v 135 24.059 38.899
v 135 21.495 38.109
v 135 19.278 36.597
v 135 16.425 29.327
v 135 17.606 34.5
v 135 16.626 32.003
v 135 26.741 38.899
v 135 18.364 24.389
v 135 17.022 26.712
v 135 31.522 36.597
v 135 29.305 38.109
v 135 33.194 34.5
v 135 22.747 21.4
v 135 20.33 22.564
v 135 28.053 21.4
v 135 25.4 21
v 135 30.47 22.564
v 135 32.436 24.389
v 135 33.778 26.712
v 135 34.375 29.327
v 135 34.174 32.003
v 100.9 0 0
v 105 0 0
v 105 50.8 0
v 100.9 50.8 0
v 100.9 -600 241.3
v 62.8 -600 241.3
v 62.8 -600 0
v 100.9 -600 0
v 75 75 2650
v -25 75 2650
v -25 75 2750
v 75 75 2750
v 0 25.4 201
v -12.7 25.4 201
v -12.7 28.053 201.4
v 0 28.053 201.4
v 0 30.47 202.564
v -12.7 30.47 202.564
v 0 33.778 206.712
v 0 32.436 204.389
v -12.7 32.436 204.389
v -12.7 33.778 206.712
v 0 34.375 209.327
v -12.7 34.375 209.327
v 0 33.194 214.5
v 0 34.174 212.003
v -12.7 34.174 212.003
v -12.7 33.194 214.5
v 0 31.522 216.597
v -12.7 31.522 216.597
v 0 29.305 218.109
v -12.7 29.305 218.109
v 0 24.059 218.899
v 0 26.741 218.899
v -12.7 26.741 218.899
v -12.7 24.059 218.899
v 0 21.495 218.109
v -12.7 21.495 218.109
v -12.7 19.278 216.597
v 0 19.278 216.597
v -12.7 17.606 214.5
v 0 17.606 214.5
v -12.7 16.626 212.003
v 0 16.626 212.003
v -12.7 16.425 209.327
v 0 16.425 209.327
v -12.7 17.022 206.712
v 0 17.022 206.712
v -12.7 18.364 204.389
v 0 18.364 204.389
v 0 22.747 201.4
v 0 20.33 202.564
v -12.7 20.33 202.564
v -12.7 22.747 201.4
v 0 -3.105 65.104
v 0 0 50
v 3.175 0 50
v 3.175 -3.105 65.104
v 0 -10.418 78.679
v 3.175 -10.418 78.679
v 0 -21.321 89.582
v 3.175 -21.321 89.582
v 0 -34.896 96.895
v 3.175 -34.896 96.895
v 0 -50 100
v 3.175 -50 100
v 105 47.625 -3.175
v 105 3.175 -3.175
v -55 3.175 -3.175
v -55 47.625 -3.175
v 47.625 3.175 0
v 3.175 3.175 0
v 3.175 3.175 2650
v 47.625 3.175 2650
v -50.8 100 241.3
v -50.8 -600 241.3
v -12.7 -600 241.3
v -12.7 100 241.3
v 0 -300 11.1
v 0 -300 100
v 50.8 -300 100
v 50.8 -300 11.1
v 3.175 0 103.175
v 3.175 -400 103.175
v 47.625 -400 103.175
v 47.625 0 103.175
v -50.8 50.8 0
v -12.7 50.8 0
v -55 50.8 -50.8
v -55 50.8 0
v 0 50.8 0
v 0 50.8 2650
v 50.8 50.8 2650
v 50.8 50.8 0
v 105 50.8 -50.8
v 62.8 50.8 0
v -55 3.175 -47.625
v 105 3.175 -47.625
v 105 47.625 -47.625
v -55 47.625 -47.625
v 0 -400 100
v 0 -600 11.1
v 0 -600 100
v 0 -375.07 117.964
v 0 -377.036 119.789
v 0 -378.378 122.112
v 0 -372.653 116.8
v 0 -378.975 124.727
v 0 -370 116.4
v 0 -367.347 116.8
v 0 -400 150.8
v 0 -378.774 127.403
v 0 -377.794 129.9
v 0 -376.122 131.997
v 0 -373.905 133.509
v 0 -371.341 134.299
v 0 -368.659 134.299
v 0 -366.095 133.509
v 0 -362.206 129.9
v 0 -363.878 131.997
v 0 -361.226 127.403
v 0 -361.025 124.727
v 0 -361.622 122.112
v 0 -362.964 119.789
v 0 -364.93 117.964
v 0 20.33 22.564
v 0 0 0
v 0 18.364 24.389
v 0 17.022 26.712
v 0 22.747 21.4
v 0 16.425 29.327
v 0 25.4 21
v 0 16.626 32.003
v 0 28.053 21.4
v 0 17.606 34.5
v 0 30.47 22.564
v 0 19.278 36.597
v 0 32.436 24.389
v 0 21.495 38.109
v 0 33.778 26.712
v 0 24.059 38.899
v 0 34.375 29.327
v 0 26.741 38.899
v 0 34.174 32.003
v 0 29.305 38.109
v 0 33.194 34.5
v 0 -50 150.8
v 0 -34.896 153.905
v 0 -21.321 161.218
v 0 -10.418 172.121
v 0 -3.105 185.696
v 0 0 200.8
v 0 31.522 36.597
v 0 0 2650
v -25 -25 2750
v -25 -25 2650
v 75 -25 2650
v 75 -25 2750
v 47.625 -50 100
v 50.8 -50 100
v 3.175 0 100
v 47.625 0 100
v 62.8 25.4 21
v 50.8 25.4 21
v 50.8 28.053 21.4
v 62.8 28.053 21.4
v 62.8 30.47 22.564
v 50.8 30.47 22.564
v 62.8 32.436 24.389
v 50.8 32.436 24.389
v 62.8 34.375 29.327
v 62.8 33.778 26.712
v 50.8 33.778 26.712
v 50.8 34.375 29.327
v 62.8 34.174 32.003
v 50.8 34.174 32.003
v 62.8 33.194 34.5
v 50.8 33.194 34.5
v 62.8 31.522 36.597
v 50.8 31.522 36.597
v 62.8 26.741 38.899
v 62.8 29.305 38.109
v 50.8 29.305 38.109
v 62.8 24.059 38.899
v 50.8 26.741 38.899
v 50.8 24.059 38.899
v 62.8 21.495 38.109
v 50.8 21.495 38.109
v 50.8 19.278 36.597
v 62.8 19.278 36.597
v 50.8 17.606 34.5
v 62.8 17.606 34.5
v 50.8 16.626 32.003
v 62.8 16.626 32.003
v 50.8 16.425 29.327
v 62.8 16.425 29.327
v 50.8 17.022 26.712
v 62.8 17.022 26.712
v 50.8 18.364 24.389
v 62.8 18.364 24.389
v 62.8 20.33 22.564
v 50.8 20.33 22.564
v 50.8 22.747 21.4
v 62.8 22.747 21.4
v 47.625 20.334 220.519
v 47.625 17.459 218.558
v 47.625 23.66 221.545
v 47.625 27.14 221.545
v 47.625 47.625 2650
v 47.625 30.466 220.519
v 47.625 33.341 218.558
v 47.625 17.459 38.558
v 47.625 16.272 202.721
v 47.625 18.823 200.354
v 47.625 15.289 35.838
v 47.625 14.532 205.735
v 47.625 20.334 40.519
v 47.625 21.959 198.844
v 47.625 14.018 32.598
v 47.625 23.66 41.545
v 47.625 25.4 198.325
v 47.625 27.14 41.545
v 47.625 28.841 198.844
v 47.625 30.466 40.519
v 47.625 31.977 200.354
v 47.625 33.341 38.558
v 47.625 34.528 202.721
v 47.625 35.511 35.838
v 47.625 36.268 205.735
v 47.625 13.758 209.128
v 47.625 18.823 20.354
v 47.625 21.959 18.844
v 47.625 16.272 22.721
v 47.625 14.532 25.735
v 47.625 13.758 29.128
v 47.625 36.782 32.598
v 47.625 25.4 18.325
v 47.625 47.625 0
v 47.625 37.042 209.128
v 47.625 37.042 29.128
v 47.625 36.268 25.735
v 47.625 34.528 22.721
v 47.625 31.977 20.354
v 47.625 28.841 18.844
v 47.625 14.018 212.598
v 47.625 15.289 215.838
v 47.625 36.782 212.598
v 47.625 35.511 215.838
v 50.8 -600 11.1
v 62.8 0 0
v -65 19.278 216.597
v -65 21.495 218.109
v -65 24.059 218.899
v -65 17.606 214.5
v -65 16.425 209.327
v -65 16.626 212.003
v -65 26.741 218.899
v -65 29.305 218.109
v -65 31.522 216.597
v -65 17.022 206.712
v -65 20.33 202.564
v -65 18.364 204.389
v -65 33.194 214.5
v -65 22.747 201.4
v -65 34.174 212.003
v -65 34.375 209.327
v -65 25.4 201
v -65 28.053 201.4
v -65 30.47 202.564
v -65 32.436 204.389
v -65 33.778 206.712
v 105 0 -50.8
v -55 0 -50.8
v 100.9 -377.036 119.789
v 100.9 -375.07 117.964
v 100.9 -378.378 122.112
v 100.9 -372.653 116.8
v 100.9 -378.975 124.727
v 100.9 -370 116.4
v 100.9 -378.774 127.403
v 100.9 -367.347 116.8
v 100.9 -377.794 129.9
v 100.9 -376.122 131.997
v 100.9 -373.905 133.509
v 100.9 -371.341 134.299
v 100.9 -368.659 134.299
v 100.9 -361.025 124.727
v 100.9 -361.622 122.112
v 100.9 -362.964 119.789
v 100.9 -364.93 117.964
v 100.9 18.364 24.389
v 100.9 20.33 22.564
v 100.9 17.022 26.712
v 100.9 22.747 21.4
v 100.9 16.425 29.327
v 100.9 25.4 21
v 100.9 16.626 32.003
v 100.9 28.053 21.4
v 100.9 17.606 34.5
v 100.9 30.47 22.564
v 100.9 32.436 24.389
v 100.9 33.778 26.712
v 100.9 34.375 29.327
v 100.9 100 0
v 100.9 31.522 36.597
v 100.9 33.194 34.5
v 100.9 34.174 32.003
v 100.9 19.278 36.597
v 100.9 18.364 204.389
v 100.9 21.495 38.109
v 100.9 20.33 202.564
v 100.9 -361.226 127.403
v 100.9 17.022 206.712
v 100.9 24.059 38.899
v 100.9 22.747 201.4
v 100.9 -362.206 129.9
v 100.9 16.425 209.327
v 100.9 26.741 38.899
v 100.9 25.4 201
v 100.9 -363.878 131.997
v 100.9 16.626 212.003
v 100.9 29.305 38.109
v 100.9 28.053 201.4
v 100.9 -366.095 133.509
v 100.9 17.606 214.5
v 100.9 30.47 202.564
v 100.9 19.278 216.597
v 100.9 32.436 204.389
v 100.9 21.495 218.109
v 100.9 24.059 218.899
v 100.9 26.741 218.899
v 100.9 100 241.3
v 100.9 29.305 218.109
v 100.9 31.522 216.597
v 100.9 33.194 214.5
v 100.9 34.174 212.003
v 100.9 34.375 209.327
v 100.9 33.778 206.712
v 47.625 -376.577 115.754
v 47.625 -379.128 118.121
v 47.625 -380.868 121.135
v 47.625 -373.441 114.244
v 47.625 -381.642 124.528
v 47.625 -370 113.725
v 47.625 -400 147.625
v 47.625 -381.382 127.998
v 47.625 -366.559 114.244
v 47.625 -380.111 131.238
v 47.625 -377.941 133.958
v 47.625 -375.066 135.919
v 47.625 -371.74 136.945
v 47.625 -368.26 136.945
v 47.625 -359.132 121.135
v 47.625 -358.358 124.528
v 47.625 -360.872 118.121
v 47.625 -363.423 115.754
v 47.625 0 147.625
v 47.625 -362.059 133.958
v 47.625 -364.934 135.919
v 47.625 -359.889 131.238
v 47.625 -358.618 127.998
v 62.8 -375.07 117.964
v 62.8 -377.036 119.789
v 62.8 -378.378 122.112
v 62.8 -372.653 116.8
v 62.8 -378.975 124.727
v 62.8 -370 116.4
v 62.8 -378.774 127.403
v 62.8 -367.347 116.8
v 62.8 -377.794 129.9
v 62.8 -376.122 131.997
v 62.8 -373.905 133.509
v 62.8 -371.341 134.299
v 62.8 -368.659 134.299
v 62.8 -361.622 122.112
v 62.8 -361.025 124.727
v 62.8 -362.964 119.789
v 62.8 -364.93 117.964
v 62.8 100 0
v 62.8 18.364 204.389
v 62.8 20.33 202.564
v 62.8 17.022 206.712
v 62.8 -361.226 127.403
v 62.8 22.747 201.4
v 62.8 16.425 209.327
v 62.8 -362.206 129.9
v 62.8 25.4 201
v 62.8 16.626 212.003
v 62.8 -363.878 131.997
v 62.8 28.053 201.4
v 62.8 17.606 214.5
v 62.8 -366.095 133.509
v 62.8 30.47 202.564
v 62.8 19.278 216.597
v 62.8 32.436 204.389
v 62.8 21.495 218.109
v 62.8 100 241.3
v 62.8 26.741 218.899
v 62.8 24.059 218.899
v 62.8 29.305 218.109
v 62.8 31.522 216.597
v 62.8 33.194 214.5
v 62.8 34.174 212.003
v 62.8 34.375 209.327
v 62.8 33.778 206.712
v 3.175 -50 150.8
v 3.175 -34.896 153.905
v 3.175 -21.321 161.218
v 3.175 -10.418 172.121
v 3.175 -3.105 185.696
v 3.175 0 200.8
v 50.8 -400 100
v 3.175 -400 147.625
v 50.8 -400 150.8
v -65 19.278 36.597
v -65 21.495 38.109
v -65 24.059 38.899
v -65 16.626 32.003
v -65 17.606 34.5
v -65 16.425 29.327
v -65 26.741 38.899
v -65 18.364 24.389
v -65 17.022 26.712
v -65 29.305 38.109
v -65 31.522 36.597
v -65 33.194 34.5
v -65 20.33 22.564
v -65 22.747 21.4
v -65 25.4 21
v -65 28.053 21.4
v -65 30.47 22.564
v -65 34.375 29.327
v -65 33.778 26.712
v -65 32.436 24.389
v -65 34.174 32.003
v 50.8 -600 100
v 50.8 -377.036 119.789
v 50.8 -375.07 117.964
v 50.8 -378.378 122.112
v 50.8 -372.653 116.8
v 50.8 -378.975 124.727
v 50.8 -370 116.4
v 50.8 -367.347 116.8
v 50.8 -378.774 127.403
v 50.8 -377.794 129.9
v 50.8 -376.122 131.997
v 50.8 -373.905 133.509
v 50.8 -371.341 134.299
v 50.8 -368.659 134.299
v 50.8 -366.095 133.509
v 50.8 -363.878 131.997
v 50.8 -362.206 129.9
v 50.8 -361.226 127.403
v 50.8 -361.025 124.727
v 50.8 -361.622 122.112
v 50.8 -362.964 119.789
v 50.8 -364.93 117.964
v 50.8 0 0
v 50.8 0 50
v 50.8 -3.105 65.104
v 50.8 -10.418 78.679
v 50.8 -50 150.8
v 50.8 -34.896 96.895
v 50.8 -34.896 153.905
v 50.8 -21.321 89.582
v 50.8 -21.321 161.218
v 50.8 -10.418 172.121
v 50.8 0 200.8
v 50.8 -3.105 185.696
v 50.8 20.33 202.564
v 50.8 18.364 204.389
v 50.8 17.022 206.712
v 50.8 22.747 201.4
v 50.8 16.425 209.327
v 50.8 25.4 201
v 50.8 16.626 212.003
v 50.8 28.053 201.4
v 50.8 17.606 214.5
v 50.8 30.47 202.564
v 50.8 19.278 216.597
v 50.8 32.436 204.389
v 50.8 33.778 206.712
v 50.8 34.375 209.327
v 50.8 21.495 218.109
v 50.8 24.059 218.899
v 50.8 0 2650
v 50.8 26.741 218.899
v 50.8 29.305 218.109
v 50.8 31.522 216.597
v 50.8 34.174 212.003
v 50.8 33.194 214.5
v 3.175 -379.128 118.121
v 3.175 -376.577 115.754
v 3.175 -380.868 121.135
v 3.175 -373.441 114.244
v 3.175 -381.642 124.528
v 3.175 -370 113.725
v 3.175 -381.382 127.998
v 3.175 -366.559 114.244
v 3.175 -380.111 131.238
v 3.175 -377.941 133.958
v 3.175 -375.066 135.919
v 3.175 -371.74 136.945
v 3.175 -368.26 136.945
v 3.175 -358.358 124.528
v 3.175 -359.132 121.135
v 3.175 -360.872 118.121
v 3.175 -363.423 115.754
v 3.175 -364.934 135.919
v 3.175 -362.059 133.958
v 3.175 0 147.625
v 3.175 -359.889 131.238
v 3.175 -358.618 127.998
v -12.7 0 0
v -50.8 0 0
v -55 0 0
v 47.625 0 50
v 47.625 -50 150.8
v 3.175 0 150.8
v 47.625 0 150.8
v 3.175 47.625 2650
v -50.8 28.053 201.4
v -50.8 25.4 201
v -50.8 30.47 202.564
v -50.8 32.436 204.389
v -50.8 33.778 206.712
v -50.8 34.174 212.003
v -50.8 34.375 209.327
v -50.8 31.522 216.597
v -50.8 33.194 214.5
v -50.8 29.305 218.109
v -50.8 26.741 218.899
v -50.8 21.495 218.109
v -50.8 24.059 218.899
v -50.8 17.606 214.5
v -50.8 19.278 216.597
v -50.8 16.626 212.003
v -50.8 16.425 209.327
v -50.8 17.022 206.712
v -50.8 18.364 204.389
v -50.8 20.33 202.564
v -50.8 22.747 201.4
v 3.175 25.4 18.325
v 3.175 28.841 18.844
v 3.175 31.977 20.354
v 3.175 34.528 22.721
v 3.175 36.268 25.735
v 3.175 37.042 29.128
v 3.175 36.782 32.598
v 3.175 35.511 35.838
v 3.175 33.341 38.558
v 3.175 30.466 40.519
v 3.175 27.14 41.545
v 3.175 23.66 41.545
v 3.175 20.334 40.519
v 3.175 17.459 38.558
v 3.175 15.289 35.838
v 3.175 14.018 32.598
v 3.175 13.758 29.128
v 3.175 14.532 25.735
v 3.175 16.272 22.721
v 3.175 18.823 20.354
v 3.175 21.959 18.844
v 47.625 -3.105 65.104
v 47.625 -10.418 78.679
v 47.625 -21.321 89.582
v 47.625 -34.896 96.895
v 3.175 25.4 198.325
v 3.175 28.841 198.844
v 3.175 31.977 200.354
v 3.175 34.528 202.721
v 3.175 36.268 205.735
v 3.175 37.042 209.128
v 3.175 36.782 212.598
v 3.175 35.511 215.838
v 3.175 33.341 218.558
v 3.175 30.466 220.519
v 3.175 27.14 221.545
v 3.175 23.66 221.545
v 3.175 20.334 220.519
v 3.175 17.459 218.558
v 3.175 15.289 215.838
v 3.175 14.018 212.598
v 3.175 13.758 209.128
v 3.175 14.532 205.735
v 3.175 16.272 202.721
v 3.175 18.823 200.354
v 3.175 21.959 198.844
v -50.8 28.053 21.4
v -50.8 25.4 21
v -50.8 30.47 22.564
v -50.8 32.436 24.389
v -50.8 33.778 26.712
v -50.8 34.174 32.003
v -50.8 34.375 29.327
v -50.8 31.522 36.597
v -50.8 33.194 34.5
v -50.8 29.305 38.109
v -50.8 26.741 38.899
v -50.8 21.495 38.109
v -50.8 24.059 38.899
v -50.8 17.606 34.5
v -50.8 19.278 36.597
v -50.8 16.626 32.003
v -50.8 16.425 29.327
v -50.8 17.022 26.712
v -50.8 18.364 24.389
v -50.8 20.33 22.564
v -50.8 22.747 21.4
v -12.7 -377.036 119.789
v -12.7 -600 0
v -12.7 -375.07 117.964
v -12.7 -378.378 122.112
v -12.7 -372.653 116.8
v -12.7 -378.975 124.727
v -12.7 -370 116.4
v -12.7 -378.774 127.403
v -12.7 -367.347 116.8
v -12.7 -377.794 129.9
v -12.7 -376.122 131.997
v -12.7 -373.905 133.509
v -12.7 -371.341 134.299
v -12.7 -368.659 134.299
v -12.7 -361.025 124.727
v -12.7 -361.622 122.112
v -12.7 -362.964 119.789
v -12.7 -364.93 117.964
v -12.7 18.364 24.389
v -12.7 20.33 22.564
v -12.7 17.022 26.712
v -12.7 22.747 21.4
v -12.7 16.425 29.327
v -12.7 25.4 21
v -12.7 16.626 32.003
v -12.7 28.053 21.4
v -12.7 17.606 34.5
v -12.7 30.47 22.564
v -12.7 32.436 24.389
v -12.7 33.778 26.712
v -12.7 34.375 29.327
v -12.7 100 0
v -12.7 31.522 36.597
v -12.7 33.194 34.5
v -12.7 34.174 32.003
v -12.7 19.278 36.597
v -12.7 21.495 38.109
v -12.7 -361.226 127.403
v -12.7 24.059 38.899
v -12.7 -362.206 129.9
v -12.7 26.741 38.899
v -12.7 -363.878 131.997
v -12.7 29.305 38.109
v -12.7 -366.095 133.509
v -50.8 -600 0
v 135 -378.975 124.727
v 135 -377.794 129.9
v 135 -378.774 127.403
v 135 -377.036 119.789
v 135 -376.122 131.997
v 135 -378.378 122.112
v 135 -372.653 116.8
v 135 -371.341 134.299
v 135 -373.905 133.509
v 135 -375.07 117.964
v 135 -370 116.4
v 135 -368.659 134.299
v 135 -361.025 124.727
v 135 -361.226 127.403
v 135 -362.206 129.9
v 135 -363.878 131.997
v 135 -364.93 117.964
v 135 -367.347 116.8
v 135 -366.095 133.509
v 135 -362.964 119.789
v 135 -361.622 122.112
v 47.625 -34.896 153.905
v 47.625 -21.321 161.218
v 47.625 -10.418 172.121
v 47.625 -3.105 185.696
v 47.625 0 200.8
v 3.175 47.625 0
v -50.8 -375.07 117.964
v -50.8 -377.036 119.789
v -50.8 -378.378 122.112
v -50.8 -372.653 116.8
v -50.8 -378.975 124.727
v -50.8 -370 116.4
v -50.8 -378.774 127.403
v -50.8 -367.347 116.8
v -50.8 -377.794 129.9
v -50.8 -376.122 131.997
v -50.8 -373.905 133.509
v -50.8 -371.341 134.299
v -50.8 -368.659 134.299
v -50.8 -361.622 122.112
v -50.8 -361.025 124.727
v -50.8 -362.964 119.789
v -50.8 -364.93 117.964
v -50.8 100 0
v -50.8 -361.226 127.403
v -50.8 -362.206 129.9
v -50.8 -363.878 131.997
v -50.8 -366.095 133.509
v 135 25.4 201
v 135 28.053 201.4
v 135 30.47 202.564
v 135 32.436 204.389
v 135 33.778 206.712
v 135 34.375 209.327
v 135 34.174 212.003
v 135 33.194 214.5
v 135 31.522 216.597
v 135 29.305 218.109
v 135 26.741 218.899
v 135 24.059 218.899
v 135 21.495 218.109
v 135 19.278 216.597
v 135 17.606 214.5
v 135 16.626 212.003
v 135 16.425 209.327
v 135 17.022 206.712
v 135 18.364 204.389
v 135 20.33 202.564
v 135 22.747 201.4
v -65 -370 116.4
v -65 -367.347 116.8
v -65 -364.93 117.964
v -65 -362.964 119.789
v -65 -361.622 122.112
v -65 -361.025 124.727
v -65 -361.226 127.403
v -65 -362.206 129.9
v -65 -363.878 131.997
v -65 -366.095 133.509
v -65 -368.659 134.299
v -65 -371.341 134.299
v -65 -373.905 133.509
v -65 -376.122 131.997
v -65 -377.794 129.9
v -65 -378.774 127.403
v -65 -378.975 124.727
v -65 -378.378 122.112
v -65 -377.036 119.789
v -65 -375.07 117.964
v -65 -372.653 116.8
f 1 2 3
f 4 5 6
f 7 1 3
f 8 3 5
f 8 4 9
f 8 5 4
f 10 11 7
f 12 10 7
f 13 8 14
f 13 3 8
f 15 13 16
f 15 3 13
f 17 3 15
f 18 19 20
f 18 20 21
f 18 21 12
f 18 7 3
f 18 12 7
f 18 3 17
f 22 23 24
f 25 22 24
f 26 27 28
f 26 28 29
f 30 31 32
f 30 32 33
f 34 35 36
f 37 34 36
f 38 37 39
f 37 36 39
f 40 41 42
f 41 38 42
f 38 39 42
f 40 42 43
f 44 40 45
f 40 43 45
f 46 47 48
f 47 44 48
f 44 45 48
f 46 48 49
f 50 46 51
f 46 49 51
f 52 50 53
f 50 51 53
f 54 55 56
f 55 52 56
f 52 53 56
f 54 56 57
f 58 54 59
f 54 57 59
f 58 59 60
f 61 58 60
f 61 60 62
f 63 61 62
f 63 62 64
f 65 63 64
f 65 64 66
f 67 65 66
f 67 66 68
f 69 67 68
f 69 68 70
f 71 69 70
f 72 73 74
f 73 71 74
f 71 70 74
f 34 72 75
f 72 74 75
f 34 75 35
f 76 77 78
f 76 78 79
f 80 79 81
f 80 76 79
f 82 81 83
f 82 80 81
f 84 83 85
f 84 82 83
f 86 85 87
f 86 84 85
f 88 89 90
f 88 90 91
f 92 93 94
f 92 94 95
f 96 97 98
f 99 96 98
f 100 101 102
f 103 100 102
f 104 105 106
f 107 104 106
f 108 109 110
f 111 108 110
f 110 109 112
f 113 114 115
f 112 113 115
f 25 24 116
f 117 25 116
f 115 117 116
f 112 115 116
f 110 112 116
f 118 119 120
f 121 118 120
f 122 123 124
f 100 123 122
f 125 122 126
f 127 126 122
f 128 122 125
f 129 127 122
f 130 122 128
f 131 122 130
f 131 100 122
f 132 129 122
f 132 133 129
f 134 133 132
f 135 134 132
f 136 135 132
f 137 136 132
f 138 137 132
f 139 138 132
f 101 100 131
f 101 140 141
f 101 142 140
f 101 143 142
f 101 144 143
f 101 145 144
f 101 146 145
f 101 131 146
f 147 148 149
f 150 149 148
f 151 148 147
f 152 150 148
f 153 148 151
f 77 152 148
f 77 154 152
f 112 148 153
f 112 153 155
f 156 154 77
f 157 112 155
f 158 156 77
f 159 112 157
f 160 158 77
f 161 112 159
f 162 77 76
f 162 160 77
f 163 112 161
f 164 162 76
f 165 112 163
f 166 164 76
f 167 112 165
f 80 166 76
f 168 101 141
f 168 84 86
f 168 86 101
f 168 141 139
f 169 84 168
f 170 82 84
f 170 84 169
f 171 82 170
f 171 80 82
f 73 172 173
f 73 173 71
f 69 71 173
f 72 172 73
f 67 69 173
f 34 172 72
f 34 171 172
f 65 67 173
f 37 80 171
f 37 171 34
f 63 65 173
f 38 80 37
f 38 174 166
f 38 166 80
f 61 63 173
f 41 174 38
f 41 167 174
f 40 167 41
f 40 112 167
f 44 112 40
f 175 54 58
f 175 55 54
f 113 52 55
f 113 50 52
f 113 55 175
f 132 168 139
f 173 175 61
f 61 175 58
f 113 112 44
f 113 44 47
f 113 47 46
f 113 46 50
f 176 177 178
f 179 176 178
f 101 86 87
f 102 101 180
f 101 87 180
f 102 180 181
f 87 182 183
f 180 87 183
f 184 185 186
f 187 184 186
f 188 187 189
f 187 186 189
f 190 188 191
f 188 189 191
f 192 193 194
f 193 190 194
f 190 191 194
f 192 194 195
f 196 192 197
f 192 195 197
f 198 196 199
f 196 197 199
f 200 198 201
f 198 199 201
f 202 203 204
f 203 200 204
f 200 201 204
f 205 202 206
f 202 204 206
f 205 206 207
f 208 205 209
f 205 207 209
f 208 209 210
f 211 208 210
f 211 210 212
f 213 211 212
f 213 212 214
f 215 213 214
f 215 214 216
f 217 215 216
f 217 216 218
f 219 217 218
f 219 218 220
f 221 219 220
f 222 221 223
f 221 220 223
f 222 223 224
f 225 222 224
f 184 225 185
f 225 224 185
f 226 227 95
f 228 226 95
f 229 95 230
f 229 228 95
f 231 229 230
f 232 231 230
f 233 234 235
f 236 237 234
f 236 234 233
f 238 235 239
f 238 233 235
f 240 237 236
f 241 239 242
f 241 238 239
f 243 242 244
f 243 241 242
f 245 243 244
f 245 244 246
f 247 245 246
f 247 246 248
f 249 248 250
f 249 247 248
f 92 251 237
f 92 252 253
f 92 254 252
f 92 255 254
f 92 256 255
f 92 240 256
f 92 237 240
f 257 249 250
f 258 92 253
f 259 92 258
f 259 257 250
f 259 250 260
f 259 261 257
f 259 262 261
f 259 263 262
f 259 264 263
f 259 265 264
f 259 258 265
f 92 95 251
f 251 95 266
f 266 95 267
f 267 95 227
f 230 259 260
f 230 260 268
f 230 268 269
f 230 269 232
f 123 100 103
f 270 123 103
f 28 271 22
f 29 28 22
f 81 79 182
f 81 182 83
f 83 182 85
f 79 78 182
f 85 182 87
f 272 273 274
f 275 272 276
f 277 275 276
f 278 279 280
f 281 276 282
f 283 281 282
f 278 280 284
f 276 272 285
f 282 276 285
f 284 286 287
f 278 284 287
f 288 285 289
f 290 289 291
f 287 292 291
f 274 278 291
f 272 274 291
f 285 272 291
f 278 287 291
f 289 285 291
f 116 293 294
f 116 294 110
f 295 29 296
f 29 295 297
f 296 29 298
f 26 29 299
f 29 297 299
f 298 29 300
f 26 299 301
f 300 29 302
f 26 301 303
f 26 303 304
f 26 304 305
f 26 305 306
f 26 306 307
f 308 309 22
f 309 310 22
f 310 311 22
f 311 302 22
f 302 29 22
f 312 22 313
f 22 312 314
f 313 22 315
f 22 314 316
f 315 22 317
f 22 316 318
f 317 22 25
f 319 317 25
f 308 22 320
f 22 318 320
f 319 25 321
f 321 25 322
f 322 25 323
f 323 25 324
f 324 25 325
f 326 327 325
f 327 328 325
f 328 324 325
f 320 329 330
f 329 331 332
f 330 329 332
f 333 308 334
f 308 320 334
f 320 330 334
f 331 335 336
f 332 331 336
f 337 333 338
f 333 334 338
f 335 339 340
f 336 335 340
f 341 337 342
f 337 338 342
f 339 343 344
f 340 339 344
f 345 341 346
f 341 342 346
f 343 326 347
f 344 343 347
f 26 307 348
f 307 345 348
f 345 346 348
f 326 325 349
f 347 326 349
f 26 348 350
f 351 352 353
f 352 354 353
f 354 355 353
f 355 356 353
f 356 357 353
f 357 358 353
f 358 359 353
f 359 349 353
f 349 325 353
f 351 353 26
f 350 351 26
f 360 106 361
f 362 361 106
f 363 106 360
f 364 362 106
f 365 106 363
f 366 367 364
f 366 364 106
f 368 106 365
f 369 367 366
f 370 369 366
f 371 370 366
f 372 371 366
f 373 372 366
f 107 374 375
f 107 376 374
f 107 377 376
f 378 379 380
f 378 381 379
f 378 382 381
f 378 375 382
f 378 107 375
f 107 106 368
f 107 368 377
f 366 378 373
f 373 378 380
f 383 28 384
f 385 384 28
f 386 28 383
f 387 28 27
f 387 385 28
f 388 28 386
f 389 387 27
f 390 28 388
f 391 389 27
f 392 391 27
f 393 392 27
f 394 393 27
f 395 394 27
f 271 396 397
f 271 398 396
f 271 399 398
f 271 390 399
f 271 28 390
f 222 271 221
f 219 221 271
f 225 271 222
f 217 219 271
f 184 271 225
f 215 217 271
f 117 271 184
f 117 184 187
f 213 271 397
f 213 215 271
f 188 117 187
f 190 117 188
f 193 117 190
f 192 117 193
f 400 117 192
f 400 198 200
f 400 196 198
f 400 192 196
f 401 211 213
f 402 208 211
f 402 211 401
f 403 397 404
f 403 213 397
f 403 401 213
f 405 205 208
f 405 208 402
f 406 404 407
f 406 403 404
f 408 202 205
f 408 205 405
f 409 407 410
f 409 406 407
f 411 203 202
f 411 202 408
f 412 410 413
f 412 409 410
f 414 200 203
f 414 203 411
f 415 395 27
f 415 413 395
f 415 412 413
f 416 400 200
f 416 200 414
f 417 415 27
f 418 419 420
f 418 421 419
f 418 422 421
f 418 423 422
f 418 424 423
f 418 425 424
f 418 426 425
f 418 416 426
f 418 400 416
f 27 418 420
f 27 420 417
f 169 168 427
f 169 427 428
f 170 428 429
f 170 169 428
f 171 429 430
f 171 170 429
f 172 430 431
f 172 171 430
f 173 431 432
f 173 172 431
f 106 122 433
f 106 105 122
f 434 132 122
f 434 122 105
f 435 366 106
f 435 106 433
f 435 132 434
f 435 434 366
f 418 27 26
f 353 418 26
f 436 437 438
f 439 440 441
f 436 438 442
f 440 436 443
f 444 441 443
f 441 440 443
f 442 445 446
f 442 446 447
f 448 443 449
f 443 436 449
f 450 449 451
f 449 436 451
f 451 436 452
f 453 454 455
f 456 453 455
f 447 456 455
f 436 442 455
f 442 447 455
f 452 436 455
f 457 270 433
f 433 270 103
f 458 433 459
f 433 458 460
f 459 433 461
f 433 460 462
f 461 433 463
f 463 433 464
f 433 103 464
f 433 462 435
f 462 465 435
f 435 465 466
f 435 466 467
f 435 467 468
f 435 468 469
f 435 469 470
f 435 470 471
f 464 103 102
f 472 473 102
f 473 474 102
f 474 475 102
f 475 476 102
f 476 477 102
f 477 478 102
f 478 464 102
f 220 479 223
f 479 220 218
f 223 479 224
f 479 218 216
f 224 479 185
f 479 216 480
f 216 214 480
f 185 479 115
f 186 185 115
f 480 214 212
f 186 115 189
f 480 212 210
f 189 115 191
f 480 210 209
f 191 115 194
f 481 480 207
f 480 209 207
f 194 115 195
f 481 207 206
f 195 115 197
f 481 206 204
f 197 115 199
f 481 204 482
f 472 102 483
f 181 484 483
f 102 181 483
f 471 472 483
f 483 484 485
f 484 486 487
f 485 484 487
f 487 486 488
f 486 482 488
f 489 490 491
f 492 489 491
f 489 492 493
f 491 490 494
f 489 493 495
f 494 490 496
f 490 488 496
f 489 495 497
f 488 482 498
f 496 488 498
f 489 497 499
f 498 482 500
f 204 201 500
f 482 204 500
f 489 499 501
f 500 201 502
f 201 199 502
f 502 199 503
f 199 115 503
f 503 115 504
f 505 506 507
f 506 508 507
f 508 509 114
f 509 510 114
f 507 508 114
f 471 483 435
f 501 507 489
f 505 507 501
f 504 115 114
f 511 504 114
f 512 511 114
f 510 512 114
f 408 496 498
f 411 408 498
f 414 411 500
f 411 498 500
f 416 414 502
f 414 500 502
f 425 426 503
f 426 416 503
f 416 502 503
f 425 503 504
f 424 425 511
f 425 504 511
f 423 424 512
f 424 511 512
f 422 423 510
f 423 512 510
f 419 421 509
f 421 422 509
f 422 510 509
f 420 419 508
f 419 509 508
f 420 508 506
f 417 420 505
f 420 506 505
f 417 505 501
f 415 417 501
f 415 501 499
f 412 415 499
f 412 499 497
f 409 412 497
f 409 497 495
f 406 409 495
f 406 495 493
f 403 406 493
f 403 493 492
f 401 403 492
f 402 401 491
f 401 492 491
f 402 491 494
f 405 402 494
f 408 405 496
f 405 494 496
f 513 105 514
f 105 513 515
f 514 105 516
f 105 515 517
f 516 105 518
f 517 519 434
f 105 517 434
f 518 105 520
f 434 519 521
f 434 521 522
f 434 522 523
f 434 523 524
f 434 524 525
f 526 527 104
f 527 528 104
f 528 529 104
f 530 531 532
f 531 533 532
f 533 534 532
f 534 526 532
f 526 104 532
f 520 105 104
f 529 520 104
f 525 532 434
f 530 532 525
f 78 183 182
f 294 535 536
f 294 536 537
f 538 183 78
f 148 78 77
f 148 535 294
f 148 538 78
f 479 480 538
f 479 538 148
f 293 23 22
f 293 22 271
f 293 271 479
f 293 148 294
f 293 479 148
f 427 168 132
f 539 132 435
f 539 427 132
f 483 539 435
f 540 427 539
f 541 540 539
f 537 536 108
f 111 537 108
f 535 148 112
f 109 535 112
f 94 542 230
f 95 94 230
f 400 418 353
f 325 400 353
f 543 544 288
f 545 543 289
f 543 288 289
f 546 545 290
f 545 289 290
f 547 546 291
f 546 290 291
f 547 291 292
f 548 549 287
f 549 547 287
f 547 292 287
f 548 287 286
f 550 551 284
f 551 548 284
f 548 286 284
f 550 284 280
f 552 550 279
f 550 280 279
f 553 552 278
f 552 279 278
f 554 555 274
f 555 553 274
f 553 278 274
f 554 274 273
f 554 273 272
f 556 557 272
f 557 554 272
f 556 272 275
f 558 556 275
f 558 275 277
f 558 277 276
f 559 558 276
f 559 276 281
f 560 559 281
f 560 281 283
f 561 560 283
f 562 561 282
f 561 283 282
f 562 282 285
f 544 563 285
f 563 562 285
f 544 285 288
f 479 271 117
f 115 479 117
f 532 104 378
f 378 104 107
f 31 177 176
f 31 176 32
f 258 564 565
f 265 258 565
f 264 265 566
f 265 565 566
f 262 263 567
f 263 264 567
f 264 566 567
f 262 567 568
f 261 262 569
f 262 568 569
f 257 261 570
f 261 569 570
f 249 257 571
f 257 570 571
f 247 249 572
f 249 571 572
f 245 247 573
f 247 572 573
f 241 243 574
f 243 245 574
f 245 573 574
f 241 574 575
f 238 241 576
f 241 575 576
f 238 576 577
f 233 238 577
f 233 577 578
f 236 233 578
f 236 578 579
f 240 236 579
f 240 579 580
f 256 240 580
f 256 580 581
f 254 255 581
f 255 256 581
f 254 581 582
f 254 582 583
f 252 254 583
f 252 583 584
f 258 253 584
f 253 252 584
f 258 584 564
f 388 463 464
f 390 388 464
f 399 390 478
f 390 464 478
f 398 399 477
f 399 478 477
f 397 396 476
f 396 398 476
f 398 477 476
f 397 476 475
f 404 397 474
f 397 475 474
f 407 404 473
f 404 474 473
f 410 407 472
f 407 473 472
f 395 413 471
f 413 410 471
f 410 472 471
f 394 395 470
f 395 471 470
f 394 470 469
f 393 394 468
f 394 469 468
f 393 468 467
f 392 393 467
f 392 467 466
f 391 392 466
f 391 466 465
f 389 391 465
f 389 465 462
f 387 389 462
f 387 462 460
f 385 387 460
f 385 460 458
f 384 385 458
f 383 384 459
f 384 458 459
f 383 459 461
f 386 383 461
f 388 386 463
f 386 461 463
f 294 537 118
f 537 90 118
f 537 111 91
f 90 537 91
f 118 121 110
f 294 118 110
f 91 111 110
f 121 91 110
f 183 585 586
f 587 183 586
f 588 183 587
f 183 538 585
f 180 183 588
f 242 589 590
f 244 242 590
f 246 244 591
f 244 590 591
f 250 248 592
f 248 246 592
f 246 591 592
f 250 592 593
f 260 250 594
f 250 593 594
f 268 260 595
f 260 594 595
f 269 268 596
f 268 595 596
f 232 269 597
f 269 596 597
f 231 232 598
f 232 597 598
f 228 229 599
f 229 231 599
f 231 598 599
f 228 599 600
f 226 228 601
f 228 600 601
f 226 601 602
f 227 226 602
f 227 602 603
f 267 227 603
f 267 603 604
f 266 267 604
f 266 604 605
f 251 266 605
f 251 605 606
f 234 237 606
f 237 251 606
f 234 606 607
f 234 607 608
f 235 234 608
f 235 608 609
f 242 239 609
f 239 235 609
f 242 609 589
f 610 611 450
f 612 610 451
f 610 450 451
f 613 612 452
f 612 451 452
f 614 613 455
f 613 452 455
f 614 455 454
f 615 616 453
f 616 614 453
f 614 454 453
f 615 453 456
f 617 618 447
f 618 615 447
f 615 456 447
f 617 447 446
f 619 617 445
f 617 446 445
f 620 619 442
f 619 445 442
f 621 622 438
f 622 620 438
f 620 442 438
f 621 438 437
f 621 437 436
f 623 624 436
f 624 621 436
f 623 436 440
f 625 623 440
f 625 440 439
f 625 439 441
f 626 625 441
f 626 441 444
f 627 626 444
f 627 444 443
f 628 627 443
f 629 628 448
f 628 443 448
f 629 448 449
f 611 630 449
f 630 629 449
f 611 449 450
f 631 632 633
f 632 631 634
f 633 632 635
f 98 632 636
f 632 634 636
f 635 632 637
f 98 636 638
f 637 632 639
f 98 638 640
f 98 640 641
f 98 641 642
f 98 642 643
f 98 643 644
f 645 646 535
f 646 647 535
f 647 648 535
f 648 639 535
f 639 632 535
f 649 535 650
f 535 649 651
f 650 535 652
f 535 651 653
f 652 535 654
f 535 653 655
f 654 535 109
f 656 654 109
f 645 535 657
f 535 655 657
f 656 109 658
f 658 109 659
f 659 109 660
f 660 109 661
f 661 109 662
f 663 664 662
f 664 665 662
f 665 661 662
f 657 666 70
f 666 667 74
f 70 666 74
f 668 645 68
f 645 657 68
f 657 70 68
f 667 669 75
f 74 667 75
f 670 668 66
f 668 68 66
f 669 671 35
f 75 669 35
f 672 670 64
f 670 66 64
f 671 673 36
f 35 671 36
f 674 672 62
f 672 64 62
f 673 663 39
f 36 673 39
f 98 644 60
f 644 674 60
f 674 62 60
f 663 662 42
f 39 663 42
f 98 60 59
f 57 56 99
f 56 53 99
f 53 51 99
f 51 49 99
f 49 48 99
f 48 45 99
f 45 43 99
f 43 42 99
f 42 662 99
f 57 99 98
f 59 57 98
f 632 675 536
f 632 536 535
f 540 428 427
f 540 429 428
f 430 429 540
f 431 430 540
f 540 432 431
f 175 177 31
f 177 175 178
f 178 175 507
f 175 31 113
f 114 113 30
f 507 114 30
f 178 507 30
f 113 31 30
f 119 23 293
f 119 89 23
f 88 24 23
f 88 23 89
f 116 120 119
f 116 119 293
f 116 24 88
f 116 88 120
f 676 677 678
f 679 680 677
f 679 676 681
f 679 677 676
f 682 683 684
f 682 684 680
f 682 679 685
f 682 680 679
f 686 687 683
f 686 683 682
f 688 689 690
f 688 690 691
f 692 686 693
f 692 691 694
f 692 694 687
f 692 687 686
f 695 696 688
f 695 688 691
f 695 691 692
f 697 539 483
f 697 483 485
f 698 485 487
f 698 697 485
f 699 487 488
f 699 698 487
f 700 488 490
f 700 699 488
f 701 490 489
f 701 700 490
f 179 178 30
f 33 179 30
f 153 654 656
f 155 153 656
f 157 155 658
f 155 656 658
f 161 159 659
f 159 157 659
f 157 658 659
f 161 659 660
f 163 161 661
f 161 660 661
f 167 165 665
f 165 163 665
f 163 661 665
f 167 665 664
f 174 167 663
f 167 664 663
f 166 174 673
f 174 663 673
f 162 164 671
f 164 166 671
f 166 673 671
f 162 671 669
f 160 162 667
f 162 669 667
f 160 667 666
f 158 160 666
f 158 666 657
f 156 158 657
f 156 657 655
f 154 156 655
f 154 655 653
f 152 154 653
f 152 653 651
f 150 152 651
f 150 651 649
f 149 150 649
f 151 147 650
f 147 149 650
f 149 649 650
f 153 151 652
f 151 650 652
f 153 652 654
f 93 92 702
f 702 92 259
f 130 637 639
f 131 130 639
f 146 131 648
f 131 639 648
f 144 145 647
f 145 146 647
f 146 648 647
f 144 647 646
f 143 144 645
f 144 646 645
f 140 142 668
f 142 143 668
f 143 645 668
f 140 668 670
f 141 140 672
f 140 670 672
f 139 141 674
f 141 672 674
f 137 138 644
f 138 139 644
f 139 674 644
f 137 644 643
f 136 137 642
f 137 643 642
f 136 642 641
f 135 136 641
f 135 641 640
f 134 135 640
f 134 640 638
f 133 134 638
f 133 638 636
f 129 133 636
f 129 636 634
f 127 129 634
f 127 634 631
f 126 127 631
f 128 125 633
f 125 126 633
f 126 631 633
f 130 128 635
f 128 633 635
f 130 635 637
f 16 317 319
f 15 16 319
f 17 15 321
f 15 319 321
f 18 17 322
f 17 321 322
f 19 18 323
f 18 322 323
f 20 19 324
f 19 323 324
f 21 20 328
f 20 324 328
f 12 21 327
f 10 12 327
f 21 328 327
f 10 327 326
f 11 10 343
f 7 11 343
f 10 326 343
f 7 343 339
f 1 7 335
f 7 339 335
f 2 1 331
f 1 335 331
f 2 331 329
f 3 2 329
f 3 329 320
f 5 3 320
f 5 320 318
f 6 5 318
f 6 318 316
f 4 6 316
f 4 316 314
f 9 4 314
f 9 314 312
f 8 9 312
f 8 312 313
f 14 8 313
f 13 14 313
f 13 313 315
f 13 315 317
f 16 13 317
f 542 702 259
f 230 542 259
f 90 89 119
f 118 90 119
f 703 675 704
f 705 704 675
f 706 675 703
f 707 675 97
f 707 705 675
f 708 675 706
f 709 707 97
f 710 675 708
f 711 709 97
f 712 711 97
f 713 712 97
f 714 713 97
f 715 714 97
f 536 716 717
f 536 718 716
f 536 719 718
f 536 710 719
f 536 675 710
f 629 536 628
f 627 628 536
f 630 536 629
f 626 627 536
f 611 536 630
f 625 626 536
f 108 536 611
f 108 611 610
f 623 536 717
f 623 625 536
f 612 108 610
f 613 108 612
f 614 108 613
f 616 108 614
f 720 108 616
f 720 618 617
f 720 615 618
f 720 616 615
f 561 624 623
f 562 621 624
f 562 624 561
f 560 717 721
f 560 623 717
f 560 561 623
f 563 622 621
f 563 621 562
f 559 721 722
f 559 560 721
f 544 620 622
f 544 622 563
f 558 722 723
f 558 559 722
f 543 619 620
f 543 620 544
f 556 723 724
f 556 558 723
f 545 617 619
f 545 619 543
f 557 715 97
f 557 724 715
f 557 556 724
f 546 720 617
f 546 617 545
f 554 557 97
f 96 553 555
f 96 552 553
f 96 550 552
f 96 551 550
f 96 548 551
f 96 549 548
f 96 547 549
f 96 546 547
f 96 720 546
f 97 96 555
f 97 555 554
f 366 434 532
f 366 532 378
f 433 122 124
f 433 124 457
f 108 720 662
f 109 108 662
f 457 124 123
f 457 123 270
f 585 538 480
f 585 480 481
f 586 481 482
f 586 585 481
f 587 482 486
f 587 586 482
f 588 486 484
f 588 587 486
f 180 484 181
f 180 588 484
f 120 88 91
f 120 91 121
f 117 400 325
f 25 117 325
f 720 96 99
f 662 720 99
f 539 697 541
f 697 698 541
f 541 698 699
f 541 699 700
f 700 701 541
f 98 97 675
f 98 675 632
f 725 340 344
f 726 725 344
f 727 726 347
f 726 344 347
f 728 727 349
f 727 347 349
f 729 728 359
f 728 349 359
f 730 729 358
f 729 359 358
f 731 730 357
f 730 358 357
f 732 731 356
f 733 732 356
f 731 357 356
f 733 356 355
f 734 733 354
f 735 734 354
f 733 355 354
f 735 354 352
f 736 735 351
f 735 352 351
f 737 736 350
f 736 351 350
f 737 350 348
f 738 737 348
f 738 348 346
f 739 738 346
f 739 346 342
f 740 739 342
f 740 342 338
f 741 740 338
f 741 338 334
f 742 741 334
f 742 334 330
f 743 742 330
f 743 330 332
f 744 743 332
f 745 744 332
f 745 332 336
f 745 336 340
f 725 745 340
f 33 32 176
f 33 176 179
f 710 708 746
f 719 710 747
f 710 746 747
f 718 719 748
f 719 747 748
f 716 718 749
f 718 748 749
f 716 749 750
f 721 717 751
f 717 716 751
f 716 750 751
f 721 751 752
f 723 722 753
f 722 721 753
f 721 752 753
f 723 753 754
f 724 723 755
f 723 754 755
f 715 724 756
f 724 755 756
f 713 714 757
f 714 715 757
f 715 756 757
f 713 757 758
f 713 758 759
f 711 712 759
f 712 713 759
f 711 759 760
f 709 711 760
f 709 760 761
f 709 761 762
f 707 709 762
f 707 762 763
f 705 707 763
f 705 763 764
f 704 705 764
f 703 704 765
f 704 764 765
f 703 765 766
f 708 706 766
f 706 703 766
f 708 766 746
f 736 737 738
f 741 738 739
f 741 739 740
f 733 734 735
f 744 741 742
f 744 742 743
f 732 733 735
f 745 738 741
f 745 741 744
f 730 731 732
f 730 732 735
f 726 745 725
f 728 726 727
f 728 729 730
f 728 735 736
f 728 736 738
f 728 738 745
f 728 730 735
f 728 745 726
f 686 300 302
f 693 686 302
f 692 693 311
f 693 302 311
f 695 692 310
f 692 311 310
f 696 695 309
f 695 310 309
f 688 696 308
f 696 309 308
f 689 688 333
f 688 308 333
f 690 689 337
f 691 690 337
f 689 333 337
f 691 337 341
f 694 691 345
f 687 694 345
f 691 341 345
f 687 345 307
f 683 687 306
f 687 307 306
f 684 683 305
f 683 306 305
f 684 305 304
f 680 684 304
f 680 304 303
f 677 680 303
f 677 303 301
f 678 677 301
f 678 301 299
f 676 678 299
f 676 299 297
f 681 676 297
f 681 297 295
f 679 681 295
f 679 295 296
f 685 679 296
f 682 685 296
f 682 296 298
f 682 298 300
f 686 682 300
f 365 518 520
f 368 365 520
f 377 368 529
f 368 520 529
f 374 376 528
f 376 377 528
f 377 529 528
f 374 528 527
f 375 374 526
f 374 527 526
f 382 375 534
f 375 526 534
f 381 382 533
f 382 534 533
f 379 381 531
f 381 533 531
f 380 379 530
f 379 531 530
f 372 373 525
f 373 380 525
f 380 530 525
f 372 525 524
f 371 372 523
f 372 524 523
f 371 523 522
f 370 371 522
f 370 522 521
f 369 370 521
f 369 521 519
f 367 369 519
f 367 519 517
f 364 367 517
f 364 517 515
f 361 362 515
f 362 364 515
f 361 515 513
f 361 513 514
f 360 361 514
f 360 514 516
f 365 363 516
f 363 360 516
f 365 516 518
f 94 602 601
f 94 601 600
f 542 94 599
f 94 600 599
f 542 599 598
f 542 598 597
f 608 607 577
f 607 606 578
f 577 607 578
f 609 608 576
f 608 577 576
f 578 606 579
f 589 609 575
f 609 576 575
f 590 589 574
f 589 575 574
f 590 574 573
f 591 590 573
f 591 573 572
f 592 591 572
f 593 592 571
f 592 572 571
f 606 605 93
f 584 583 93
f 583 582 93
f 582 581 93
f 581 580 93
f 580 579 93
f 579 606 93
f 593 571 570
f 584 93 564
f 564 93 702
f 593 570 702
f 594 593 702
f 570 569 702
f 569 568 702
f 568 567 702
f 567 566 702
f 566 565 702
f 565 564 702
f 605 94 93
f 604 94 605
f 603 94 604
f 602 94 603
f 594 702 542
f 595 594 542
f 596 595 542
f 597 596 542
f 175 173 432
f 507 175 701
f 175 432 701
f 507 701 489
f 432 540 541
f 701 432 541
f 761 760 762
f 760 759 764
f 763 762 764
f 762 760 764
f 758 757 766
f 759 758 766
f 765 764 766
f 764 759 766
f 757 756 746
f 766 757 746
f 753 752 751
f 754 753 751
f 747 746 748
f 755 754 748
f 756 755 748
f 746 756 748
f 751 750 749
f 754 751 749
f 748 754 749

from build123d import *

# Parameters (mm, degrees)
SKETCH013_R   = 9
PAD016_DEPTH  = 200
BOX_W         = 100
BOX_H         = 100
BOX_DEPTH     = 100
SKETCH010_W   = 38.1
SKETCH010_H   = 241.3
PAD013_DEPTH  = 700
SKETCH011_R   = 9
PAD014_DEPTH  = 200
SKETCH014_W   = 50.8
SKETCH014_H   = 50.8
SKETCH014_W_2 = 44.45
SKETCH014_H_2 = 44.45
PAD017_DEPTH  = 160
SKETCH015_W   = 38.1
SKETCH015_H   = 241.3
PAD018_DEPTH  = 700
SKETCH016_W   = 50.8
SKETCH016_H   = 88.9
PAD019_DEPTH  = 300
PAD005_DEPTH  = 3.175
PAD004_DEPTH  = 3.175
PAD002_DEPTH  = 3.175
SKETCH004_R   = 11.675
SKETCH004_R_2 = 8.5
PAD007_DEPTH  = 50.8
SKETCH005_R   = 9
PAD008_DEPTH  = 50.8
SKETCH001_W   = 50.8
SKETCH001_H   = 50.8
SKETCH001_W_2 = 44.45
SKETCH001_H_2 = 44.45
PAD001_DEPTH  = 400
SKETCH006_R   = 11.675
SKETCH006_R_2 = 8.5
PAD009_DEPTH  = 50.8
SKETCH007_R   = 11.675
SKETCH007_R_2 = 8.5
PAD010_DEPTH  = 50.8
SKETCH009_R   = 9
PAD012_DEPTH  = 50.8
SKETCH008_R   = 9
PAD011_DEPTH  = 50.8
SKETCH_W      = 50.8
SKETCH_H      = 50.8
SKETCH_W_2    = 44.45
SKETCH_H_2    = 44.45
PAD_DEPTH     = 2650
PAD006_DEPTH  = 3.175
SKETCH012_R   = 9
PAD015_DEPTH  = 200


with BuildPart() as lower_bolt:
    # Sketch013 → Pad016 (new body)
    with BuildSketch(Plane(origin=(-65, 25.4, 30), x_dir=(0, 0, -1), z_dir=(1, 0, 0))):
        Circle(SKETCH013_R)
    extrude(amount=PAD016_DEPTH)


with BuildPart() as cube:
    # Box → Box (new body)
    with BuildSketch(Plane(origin=(-25, -25, 2650), x_dir=(1, 0, 0), z_dir=(0, 0, 1))):
        with Locations((50, 50)):
            Rectangle(BOX_W, BOX_H)
    extrude(amount=BOX_DEPTH)


with BuildPart() as joist:
    # Sketch010 → Pad013 (new body)
    with BuildSketch(Plane(origin=(-50.8, 100, 0), x_dir=(1, 0, 0), z_dir=(0, -1, 0))):
        with Locations((19.05, 120.65)):
            Rectangle(SKETCH010_W, SKETCH010_H)
    extrude(amount=PAD013_DEPTH)


with BuildPart() as brace_bolt:
    # Sketch011 → Pad014 (new body)
    with BuildSketch(Plane(origin=(-65, -370, 125.4), x_dir=(0, 0, -1), z_dir=(1, 0, 0))):
        Circle(SKETCH011_R)
    extrude(amount=PAD014_DEPTH)


with BuildPart() as lower_support_tube:
    # Sketch014 → Pad017 (new body)
    with BuildSketch(Plane(origin=(105, 0, 0), x_dir=(0, 0, -1), z_dir=(1, 0, 0))):
        with Locations((25.4, 25.4)):
            Rectangle(SKETCH014_W, SKETCH014_H)
        with Locations((25.4, 25.4)):
            Rectangle(SKETCH014_W_2, SKETCH014_H_2, mode=Mode.SUBTRACT)
    extrude(amount=-PAD017_DEPTH)


with BuildPart() as pad018:
    # Sketch015 → Pad018 (new body)
    with BuildSketch(Plane(origin=(62.8, 100, 0), x_dir=(1, 0, 0), z_dir=(0, -1, 0))):
        with Locations((19.05, 120.65)):
            Rectangle(SKETCH015_W, SKETCH015_H)
    extrude(amount=PAD018_DEPTH)


with BuildPart() as brace_support:
    # Sketch016 → Pad019 (new body)
    with BuildSketch(Plane(origin=(0, -300, 11.1), x_dir=(1, 0, 0), z_dir=(0, -1, 0))):
        with Locations((25.4, 44.45)):
            Rectangle(SKETCH016_W, SKETCH016_H)
    extrude(amount=PAD019_DEPTH)


with BuildPart() as gusset3:
    # Sketch003 → Pad005 (new body)
    with BuildSketch(Plane(origin=(47.625, 0, 150.8), x_dir=(0, 1, 0), z_dir=(1, 0, 0))):
        with BuildLine():
            Line((0, 0), (0, 50))
            ThreePointArc((-50, 0), (-15.471731, 15.471731), (0, 50))
            Line((0, 0), (-50, 0))
        make_face()
    extrude(amount=PAD005_DEPTH)


with BuildPart() as gusset2:
    # MirroredSketch → Pad004 (new body)
    with BuildSketch(Plane(origin=(0, 0, 100), x_dir=(0, 1, 0), z_dir=(1, 0, 0))):
        with BuildLine():
            Line((0, 0), (0, -50))
            ThreePointArc((0, -50), (-15.471731, -15.471731), (-50, 0))
            Line((0, 0), (-50, 0))
        make_face()
    extrude(amount=PAD004_DEPTH)


with BuildPart() as gusset1:
    # Sketch002 → Pad002 (new body)
    with BuildSketch(Plane(origin=(0, 0, 150.8), x_dir=(0, 1, 0), z_dir=(1, 0, 0))):
        with BuildLine():
            Line((0, 0), (0, 50))
            ThreePointArc((-50, 0), (-15.471731, 15.471731), (0, 50))
            Line((0, 0), (-50, 0))
        make_face()
    extrude(amount=PAD002_DEPTH)


with BuildPart() as brace_bolt_tube:
    # Sketch004 → Pad007 (new body)
    with BuildSketch(Plane(origin=(0, -370, 125.4), x_dir=(0, 0, -1), z_dir=(1, 0, 0))):
        Circle(SKETCH004_R)
        Circle(SKETCH004_R_2, mode=Mode.SUBTRACT)
    extrude(amount=PAD007_DEPTH)


with BuildPart() as brace_bolt_hole:
    # Sketch005 → Pad008 (new body)
    with BuildSketch(Plane(origin=(0, -370, 125.4), x_dir=(0, 0, -1), z_dir=(1, 0, 0))):
        Circle(SKETCH005_R)
    extrude(amount=PAD008_DEPTH)


with BuildPart() as brace_fusion:
    # Sketch001 → Pad001 (new body)
    with BuildSketch(Plane(origin=(0, 0, 100), x_dir=(1, 0, 0), z_dir=(0, -1, 0))):
        with Locations((25.4, 25.4)):
            Rectangle(SKETCH001_W, SKETCH001_H)
        with Locations((25.4, 25.4)):
            Rectangle(SKETCH001_W_2, SKETCH001_H_2, mode=Mode.SUBTRACT)
    extrude(amount=PAD001_DEPTH)

    # Cut: cut Brace Bolt Hole
    add(brace_bolt_hole.part, mode=Mode.SUBTRACT)

    # Fusion: union Brace Bolt Tube
    add(brace_bolt_tube.part)


with BuildPart() as lower_bolt_tube:
    # Sketch006 → Pad009 (new body)
    with BuildSketch(Plane(origin=(0, 25.4, 30), x_dir=(0, 0, -1), z_dir=(1, 0, 0))):
        Circle(SKETCH006_R)
        Circle(SKETCH006_R_2, mode=Mode.SUBTRACT)
    extrude(amount=PAD009_DEPTH)


with BuildPart() as upper_bolt_tube:
    # Sketch007 → Pad010 (new body)
    with BuildSketch(Plane(origin=(0, 25.4, 210), x_dir=(0, 0, -1), z_dir=(1, 0, 0))):
        Circle(SKETCH007_R)
        Circle(SKETCH007_R_2, mode=Mode.SUBTRACT)
    extrude(amount=PAD010_DEPTH)


with BuildPart() as upper_bolt_hole:
    # Sketch009 → Pad012 (new body)
    with BuildSketch(Plane(origin=(0, 25.4, 210), x_dir=(0, 0, -1), z_dir=(1, 0, 0))):
        Circle(SKETCH009_R)
    extrude(amount=PAD012_DEPTH)


with BuildPart() as lower_bolt_hole:
    # Sketch008 → Pad011 (new body)
    with BuildSketch(Plane(origin=(0, 25.4, 30), x_dir=(0, 0, -1), z_dir=(1, 0, 0))):
        Circle(SKETCH008_R)
    extrude(amount=PAD011_DEPTH)


with BuildPart() as post_fusion:
    # Sketch → Pad (new body)
    with BuildSketch(Plane.XY):
        with Locations((25.4, 25.4)):
            Rectangle(SKETCH_W, SKETCH_H)
        with Locations((25.4, 25.4)):
            Rectangle(SKETCH_W_2, SKETCH_H_2, mode=Mode.SUBTRACT)
    extrude(amount=PAD_DEPTH)

    # Cut001: cut Lower Bolt Hole
    add(lower_bolt_hole.part, mode=Mode.SUBTRACT)

    # Cut002: cut Upper Bolt Hole
    add(upper_bolt_hole.part, mode=Mode.SUBTRACT)

    # Fusion001: union Lower Bolt Tube, Upper Bolt Tube
    add(lower_bolt_tube.part)
    add(upper_bolt_tube.part)


with BuildPart() as fusion004:
    # MirroredSketch001 → Pad006 (new body)
    with BuildSketch(Plane(origin=(47.625, 0, 100), x_dir=(0, 1, 0), z_dir=(1, 0, 0))):
        with BuildLine():
            Line((0, 0), (0, -50))
            ThreePointArc((0, -50), (-15.471731, -15.471731), (-50, 0))
            Line((0, 0), (-50, 0))
        make_face()
    extrude(amount=PAD006_DEPTH)

    # Fusion002: union Gusset3, Gusset2, Gusset1, Brace Fusion, Post Fusion
    add(gusset3.part)
    add(gusset2.part)
    add(gusset1.part)
    add(brace_fusion.part)
    add(post_fusion.part)

    # Fusion003: union Joist, Brace Bolt, Lower support Tube, Pad018, Brace Support
    add(joist.part)
    add(brace_bolt.part)
    add(lower_support_tube.part)
    add(pad018.part)
    add(brace_support.part)

    # Fusion004: union Cube
    add(cube.part)


with BuildPart() as fusion005:
    # Sketch012 → Pad015 (new body)
    with BuildSketch(Plane(origin=(-65, 25.4, 210), x_dir=(0, 0, -1), z_dir=(1, 0, 0))):
        Circle(SKETCH012_R)
    extrude(amount=PAD015_DEPTH)

    # Fusion005: union Lower Bolt, Fusion004
    add(lower_bolt.part)
    add(fusion004.part)


solid = fusion005.part
